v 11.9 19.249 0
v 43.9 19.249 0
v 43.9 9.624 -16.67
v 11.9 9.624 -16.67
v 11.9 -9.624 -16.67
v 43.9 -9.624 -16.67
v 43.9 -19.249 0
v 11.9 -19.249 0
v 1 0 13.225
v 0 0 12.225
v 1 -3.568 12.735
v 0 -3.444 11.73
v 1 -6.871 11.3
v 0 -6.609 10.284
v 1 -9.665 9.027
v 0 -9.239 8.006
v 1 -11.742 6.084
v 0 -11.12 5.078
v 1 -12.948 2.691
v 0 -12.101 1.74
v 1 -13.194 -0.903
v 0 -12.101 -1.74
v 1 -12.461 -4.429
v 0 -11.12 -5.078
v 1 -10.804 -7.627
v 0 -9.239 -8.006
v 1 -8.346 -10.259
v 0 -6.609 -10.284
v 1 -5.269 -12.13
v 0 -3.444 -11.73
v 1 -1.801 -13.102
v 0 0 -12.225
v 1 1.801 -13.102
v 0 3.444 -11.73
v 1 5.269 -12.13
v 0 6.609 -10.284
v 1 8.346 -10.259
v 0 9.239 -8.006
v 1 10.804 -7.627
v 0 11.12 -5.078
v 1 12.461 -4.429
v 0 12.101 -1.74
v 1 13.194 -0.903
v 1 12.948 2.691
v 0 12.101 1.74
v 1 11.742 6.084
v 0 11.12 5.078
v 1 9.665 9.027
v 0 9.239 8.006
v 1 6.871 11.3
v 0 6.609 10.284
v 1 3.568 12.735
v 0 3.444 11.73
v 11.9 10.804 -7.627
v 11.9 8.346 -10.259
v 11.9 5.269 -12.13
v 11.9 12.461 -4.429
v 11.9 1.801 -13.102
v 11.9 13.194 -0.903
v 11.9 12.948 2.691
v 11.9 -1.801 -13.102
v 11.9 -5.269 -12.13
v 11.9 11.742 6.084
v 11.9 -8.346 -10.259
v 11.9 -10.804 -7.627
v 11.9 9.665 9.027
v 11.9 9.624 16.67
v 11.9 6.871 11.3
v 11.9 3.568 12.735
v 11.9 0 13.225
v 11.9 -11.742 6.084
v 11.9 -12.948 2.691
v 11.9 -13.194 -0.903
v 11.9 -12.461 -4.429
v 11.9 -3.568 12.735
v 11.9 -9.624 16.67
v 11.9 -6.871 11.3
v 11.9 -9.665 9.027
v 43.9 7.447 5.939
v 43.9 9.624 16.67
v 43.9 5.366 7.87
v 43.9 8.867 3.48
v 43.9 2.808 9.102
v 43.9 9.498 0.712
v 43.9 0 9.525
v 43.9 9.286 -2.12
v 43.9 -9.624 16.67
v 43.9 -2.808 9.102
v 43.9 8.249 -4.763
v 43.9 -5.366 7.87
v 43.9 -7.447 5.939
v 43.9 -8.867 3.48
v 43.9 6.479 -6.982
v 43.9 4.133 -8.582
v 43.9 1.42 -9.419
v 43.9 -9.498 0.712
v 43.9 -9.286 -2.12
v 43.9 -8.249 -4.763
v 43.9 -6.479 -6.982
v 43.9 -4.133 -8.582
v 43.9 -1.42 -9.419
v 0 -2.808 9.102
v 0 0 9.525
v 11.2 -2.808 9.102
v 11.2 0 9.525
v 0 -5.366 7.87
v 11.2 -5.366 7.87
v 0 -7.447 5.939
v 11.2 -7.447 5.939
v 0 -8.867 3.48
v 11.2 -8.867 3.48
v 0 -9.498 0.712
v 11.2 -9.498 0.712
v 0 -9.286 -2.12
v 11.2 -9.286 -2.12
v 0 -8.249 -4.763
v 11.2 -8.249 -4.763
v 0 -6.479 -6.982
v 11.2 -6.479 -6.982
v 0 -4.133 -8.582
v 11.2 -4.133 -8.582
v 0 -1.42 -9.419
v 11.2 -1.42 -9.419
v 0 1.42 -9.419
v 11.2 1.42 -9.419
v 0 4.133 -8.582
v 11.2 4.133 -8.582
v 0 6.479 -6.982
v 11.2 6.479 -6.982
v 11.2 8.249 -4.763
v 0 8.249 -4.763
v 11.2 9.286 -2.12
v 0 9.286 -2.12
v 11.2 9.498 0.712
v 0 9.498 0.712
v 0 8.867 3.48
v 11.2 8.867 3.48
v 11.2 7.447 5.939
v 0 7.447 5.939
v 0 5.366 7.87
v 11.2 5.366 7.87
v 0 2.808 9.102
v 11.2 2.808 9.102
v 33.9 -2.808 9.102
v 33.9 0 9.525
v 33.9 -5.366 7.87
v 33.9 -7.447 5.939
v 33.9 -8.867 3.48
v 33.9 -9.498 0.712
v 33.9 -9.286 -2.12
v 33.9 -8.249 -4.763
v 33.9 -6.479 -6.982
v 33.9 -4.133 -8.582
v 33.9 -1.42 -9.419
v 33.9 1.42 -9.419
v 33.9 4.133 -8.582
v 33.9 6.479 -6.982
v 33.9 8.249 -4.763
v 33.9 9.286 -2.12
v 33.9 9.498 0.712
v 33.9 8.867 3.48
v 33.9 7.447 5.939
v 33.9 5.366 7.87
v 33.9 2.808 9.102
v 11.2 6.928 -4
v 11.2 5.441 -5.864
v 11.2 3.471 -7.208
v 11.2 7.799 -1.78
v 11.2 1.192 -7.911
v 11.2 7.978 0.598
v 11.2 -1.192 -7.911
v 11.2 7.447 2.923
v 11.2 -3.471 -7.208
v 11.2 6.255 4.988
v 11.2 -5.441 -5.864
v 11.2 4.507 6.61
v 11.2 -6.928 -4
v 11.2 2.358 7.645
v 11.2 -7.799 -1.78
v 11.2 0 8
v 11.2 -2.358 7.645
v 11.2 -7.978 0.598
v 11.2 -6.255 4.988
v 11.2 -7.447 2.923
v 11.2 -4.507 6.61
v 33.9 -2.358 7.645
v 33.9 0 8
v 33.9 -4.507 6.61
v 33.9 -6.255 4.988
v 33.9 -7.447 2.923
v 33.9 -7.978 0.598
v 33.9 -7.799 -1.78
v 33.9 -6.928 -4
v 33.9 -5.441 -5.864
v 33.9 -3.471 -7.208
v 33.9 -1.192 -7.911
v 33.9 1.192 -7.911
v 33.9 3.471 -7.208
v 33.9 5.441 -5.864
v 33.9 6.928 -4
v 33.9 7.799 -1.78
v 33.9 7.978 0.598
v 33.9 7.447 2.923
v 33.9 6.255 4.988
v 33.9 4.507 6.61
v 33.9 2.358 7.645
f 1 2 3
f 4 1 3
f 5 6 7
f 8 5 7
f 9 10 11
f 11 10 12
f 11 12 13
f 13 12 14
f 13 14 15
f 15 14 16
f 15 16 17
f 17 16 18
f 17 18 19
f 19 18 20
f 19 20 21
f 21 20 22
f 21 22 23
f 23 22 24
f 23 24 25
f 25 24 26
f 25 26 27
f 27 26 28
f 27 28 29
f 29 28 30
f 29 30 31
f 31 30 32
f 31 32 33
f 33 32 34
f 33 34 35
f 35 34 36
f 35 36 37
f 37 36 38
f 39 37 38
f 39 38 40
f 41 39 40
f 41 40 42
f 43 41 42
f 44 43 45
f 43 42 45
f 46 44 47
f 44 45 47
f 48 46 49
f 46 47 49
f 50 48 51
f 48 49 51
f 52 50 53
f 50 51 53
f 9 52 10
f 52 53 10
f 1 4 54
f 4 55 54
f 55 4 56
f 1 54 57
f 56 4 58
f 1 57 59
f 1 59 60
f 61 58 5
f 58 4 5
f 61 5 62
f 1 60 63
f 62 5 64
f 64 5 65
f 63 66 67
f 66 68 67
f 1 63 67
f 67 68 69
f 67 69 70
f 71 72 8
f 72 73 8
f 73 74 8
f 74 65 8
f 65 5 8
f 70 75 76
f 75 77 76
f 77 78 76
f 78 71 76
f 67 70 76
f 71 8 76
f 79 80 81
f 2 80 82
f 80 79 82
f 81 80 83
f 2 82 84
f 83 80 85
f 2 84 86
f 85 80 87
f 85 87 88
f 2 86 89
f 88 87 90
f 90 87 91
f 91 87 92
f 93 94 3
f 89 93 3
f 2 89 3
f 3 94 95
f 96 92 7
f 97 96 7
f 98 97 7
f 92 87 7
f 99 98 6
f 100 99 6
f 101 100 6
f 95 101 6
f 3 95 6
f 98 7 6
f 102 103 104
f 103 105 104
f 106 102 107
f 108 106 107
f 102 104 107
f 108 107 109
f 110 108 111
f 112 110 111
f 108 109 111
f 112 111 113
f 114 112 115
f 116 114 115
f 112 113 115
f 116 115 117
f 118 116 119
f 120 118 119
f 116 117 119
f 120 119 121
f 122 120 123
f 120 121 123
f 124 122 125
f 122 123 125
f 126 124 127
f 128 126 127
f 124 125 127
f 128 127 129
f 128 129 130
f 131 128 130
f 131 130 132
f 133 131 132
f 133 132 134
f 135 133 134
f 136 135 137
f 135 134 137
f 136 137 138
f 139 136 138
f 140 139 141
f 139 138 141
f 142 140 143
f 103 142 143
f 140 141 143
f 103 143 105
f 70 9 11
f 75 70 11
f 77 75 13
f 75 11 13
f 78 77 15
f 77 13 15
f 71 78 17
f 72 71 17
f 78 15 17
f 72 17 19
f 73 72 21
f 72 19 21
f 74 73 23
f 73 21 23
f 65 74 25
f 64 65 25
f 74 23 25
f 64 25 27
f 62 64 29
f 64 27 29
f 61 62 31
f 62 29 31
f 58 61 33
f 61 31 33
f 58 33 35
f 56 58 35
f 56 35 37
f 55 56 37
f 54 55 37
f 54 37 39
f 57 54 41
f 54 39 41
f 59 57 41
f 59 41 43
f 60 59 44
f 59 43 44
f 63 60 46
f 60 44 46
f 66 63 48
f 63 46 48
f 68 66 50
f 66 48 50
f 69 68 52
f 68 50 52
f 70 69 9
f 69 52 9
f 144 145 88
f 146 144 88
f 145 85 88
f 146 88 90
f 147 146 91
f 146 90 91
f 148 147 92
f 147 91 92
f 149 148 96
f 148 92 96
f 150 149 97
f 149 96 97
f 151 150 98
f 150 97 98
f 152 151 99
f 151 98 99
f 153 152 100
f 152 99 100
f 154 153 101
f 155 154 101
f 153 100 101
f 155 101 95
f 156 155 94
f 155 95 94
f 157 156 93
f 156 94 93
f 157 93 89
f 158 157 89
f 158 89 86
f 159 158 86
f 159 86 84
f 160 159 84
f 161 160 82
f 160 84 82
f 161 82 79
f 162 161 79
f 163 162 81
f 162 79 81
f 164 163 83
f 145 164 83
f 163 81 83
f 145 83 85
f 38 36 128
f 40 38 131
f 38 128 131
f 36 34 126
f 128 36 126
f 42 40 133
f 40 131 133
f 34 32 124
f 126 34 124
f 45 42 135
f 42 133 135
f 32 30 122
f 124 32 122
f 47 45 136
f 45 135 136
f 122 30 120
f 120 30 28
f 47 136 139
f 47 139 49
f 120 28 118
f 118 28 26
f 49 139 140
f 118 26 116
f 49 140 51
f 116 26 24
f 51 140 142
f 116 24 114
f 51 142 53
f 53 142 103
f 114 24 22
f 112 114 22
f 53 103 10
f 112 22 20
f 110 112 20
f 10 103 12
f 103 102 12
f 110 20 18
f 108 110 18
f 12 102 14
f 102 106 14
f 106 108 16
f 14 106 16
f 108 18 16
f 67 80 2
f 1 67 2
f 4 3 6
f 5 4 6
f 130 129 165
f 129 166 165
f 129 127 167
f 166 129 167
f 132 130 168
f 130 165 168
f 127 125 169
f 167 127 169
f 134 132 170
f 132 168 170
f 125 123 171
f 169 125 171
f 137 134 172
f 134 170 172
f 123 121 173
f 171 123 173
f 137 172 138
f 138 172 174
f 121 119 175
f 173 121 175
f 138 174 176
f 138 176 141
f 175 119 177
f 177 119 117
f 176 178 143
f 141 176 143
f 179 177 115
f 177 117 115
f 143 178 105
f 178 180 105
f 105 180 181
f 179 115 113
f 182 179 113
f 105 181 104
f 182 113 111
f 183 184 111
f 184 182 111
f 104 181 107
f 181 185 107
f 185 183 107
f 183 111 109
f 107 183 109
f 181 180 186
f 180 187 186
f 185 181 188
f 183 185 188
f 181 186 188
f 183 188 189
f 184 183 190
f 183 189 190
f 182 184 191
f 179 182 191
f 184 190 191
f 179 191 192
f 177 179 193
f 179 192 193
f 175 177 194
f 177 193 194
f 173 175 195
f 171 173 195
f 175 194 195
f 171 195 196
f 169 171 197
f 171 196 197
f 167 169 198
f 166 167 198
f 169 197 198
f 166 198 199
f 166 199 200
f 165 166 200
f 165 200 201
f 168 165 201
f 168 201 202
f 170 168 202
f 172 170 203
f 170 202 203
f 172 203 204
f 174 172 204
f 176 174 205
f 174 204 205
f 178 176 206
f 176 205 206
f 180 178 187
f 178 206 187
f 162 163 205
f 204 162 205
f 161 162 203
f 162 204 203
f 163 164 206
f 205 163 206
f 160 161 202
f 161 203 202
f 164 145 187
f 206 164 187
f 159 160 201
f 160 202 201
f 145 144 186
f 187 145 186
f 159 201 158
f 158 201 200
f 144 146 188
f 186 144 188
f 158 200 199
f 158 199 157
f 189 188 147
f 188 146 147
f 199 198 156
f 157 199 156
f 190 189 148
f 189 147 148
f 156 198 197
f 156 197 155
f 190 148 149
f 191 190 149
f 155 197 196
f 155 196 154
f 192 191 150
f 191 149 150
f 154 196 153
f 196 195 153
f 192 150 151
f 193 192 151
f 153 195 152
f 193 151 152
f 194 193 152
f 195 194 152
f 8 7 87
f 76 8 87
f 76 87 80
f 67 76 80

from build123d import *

# Parameters (mm, degrees)
F2_R     = 20
F3_DEPTH = 43.901
F4_SIZE  = 1


with BuildPart() as f1:
    # F0 (on Front) → F1 (revolve)
    with BuildSketch(Plane.XZ):
        Polygon((33.9, 9.525), (43.9, 9.525), (43.9, 20), (11.9, 20), (11.9, 13.225), (0, 13.225), (0, 9.525), (11.2, 9.525), (11.2, 8), (33.9, 8), align=None)
    revolve(axis=Axis((21.95, 0, 0), (1, 0, 0)))

    # F2 (on face) → F3 (cut, through all)
    with BuildSketch(Plane.YZ.offset(43.9)):
        Circle(F2_R)
        Polygon((-9.624429, 16.67), (9.624429, 16.67), (19.248858, 0), (9.624429, -16.67), (-9.624429, -16.67), (-19.248858, 0), align=None, mode=Mode.SUBTRACT)
    extrude(amount=-F3_DEPTH, mode=Mode.SUBTRACT)

    # F4
    f4_edges = [f1.edges().sort_by_distance(p)[0] for p in [
        (0, 0, -13.225),
    ]]
    chamfer(f4_edges, length=F4_SIZE)


solid = f1.part
